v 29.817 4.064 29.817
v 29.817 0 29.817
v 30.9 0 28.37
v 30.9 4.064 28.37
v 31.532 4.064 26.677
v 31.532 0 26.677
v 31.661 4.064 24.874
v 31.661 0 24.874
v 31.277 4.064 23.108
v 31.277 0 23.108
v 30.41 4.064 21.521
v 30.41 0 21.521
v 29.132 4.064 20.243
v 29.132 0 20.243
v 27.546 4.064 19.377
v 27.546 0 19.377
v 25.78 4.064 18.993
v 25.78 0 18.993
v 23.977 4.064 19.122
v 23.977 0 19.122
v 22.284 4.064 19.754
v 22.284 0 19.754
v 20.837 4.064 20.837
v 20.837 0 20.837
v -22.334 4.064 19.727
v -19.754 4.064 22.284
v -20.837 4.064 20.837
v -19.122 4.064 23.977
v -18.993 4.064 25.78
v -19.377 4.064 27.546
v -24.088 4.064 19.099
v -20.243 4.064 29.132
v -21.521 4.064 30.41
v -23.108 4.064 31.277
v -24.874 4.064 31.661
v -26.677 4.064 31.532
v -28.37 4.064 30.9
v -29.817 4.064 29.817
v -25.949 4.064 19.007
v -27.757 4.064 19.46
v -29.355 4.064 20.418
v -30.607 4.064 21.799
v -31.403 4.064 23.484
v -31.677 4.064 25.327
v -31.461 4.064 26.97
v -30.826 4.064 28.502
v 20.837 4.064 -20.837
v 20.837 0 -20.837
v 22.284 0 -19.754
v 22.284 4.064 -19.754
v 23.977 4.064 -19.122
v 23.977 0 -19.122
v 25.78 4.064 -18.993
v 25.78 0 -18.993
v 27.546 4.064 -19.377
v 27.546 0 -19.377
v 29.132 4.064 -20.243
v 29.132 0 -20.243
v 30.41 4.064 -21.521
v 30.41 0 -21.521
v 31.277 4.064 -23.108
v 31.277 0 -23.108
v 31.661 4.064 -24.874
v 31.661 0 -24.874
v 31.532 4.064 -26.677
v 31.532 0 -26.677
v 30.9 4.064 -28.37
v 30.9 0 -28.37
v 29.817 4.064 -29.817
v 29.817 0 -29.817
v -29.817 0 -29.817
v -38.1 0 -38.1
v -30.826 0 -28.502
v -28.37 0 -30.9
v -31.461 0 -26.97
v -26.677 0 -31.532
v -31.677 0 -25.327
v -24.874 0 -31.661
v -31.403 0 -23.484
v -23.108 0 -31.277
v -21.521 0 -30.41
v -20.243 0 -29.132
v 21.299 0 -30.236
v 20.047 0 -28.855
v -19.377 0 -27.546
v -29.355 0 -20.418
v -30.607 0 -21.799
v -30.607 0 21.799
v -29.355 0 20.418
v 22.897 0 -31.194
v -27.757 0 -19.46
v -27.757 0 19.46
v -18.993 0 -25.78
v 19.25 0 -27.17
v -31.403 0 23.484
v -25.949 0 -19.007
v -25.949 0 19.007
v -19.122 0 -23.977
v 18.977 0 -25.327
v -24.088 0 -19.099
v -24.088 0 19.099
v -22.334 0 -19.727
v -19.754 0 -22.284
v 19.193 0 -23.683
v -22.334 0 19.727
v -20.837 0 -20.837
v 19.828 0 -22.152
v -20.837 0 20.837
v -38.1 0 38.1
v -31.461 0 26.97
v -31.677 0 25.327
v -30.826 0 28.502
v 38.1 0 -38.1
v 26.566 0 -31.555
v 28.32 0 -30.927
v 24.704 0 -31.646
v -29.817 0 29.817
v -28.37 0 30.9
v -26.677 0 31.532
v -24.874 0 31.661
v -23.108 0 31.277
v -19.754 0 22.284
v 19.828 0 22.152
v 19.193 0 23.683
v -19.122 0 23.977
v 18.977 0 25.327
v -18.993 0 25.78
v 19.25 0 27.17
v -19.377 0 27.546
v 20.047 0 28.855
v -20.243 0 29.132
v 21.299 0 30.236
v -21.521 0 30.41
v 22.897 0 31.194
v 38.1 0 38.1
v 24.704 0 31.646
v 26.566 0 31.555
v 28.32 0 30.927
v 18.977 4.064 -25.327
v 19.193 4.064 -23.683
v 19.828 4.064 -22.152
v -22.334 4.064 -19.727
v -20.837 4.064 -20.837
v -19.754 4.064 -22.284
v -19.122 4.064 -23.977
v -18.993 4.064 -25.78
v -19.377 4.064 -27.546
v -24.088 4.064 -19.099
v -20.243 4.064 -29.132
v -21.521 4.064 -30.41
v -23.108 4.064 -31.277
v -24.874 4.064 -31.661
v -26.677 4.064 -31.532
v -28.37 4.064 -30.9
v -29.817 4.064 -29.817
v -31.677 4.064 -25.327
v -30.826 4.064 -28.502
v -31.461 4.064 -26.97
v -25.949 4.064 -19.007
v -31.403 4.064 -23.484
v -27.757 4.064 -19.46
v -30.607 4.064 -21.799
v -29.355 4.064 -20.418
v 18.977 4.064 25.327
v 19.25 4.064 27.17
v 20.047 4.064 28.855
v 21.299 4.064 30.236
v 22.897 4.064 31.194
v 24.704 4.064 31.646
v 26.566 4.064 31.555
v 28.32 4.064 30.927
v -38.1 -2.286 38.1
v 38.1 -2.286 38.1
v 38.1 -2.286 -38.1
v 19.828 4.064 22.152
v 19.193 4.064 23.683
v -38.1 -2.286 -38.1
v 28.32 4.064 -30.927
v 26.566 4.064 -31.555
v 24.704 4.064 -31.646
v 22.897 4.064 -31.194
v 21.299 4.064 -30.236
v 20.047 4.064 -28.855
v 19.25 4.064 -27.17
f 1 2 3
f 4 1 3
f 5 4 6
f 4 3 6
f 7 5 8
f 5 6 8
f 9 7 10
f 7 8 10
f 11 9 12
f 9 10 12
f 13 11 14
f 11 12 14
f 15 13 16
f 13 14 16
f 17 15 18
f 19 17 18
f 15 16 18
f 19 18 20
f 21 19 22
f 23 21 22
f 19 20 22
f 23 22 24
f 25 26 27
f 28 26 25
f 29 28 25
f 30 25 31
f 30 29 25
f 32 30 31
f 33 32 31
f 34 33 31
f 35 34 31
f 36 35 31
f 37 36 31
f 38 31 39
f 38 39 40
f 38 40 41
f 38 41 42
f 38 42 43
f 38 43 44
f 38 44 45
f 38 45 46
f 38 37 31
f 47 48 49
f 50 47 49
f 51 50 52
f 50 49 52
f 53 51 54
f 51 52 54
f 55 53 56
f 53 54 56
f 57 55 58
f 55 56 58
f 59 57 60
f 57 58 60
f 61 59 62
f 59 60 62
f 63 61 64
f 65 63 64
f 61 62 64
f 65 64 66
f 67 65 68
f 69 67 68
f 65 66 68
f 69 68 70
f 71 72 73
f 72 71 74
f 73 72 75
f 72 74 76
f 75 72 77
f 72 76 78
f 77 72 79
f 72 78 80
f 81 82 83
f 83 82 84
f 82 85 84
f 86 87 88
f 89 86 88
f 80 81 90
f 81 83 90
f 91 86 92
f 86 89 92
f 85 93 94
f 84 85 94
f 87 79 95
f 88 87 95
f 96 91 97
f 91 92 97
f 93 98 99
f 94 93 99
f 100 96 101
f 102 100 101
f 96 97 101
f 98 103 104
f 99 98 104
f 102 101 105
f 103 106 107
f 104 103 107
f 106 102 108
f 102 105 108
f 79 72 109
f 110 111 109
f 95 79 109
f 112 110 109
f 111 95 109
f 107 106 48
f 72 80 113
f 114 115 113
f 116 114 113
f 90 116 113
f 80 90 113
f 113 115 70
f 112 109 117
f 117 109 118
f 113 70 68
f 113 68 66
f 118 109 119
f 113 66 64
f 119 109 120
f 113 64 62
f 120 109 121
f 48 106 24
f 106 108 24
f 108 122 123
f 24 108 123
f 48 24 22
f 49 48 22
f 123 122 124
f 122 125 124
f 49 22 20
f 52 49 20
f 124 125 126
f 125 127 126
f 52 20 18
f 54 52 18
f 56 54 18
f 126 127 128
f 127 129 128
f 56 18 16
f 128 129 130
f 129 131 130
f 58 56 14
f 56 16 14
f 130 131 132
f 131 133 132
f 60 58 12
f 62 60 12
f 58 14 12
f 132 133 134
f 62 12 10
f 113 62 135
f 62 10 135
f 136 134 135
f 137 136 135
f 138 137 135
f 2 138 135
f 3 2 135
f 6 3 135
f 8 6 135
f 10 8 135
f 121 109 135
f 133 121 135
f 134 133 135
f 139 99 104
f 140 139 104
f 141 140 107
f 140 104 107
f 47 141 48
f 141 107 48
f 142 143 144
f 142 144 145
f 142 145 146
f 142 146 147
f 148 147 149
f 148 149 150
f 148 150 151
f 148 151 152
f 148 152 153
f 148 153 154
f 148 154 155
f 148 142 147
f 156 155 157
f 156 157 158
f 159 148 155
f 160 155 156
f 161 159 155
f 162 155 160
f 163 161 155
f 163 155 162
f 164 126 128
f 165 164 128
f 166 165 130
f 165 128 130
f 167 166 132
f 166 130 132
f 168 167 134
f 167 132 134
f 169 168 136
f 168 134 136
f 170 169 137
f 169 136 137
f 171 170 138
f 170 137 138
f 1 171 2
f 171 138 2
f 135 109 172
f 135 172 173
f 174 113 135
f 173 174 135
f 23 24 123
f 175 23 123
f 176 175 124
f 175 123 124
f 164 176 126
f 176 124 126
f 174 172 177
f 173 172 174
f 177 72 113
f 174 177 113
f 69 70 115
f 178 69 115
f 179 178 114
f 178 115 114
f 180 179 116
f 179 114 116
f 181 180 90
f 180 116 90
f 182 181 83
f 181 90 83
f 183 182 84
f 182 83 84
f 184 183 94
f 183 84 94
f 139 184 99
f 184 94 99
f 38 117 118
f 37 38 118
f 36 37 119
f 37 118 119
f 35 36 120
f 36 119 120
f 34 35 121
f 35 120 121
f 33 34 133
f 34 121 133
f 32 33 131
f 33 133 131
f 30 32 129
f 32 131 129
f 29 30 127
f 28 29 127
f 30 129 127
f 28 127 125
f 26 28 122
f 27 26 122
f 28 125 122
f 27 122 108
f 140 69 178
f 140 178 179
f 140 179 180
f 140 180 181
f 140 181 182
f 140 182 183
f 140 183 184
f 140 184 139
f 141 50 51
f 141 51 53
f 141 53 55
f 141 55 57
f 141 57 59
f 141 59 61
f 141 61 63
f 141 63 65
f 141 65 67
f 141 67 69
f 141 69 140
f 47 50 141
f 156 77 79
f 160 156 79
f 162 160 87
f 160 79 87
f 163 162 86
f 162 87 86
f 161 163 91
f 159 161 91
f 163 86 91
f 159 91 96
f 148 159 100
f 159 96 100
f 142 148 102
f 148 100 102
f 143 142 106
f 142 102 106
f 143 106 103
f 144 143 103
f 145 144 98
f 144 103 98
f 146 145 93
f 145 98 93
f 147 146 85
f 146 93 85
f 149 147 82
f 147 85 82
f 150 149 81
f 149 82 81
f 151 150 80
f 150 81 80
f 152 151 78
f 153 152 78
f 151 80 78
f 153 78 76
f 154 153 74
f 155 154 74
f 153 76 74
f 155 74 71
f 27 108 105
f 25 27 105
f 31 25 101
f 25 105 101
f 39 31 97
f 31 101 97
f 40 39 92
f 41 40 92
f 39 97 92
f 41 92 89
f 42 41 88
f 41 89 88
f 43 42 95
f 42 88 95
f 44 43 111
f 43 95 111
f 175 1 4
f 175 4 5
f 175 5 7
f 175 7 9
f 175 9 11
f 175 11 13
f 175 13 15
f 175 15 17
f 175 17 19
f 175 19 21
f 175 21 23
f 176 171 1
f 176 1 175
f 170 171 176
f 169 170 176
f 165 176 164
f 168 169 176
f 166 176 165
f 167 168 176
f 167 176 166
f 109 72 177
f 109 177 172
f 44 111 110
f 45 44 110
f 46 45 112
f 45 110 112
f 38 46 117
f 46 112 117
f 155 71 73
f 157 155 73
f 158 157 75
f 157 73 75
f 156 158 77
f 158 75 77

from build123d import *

# Parameters (mm, degrees)
F0_W     = 76.2
F0_H     = 76.2
F1_DEPTH = 2.286
F3_DEPTH = 4.064


with BuildPart() as f1:
    # F0 (on Front) → F1 (new body)
    with BuildSketch(Plane.XZ):
        Rectangle(F0_W, F0_H)
    extrude(amount=F1_DEPTH)

    # F2 (on face) → F3 (join)
    with BuildSketch(Plane(origin=(0, 0, 0), x_dir=(-1, 0, 0), z_dir=(0, 1, 0))):
        with BuildLine():
            ThreePointArc((20.8367786429, -20.8367786429), (20.8367786429, -29.8170347639), (29.8170347639, -29.8170347639))
            Line((29.8170347639, -29.8170347639), (20.8367786429, -20.8367786429))
        make_face()
        with BuildLine():
            Line((-20.8367786429, -20.8367786429), (-29.8170347639, -29.8170347639))
            ThreePointArc((-29.8170347639, -29.8170347639), (-22.8968669079, -31.1935417349), (-18.9769067034, -25.3269067034))
            ThreePointArc((-18.9769067034, -25.3269067034), (-19.460271672, -22.8968669079), (-20.8367786429, -20.8367786429))
        make_face()
        with BuildLine():
            ThreePointArc((-20.8367786429, -20.8367786429), (-29.8170347639, -20.8367786429), (-29.8170347639, -29.8170347639))
            Line((-29.8170347639, -29.8170347639), (-20.8367786429, -20.8367786429))
        make_face()
        with BuildLine():
            Line((-20.8367786429, 20.8367786429), (-29.8170347639, 29.8170347639))
            ThreePointArc((-29.8170347639, 29.8170347639), (-29.8170347639, 20.8367786429), (-20.8367786429, 20.8367786429))
        make_face()
        with BuildLine():
            ThreePointArc((-18.9769067034, 25.3269067034), (-22.8968669079, 31.1935417349), (-29.8170347639, 29.8170347639))
            Line((-29.8170347639, 29.8170347639), (-20.8367786429, 20.8367786429))
            ThreePointArc((-20.8367786429, 20.8367786429), (-19.460271672, 22.8968669079), (-18.9769067034, 25.3269067034))
        make_face()
        with BuildLine():
            Line((20.8367786429, 20.8367786429), (29.8170347639, 29.8170347639))
            ThreePointArc((29.8170347639, 29.8170347639), (20.8367786429, 29.8170347639), (20.8367786429, 20.8367786429))
        make_face()
        with BuildLine():
            ThreePointArc((31.6769067034, 25.3269067034), (31.1935417349, 27.7569464989), (29.8170347639, 29.8170347639))
            Line((29.8170347639, 29.8170347639), (20.8367786429, 20.8367786429))
            ThreePointArc((20.8367786429, 20.8367786429), (27.7569464989, 19.460271672), (31.6769067034, 25.3269067034))
        make_face()
        with BuildLine():
            Line((20.8367786429, -20.8367786429), (29.8170347639, -29.8170347639))
            ThreePointArc((29.8170347639, -29.8170347639), (31.1935417349, -27.7569464989), (31.6769067034, -25.3269067034))
            ThreePointArc((31.6769067034, -25.3269067034), (27.7569464989, -19.460271672), (20.8367786429, -20.8367786429))
        make_face()
    extrude(amount=F3_DEPTH)


solid = f1.part
